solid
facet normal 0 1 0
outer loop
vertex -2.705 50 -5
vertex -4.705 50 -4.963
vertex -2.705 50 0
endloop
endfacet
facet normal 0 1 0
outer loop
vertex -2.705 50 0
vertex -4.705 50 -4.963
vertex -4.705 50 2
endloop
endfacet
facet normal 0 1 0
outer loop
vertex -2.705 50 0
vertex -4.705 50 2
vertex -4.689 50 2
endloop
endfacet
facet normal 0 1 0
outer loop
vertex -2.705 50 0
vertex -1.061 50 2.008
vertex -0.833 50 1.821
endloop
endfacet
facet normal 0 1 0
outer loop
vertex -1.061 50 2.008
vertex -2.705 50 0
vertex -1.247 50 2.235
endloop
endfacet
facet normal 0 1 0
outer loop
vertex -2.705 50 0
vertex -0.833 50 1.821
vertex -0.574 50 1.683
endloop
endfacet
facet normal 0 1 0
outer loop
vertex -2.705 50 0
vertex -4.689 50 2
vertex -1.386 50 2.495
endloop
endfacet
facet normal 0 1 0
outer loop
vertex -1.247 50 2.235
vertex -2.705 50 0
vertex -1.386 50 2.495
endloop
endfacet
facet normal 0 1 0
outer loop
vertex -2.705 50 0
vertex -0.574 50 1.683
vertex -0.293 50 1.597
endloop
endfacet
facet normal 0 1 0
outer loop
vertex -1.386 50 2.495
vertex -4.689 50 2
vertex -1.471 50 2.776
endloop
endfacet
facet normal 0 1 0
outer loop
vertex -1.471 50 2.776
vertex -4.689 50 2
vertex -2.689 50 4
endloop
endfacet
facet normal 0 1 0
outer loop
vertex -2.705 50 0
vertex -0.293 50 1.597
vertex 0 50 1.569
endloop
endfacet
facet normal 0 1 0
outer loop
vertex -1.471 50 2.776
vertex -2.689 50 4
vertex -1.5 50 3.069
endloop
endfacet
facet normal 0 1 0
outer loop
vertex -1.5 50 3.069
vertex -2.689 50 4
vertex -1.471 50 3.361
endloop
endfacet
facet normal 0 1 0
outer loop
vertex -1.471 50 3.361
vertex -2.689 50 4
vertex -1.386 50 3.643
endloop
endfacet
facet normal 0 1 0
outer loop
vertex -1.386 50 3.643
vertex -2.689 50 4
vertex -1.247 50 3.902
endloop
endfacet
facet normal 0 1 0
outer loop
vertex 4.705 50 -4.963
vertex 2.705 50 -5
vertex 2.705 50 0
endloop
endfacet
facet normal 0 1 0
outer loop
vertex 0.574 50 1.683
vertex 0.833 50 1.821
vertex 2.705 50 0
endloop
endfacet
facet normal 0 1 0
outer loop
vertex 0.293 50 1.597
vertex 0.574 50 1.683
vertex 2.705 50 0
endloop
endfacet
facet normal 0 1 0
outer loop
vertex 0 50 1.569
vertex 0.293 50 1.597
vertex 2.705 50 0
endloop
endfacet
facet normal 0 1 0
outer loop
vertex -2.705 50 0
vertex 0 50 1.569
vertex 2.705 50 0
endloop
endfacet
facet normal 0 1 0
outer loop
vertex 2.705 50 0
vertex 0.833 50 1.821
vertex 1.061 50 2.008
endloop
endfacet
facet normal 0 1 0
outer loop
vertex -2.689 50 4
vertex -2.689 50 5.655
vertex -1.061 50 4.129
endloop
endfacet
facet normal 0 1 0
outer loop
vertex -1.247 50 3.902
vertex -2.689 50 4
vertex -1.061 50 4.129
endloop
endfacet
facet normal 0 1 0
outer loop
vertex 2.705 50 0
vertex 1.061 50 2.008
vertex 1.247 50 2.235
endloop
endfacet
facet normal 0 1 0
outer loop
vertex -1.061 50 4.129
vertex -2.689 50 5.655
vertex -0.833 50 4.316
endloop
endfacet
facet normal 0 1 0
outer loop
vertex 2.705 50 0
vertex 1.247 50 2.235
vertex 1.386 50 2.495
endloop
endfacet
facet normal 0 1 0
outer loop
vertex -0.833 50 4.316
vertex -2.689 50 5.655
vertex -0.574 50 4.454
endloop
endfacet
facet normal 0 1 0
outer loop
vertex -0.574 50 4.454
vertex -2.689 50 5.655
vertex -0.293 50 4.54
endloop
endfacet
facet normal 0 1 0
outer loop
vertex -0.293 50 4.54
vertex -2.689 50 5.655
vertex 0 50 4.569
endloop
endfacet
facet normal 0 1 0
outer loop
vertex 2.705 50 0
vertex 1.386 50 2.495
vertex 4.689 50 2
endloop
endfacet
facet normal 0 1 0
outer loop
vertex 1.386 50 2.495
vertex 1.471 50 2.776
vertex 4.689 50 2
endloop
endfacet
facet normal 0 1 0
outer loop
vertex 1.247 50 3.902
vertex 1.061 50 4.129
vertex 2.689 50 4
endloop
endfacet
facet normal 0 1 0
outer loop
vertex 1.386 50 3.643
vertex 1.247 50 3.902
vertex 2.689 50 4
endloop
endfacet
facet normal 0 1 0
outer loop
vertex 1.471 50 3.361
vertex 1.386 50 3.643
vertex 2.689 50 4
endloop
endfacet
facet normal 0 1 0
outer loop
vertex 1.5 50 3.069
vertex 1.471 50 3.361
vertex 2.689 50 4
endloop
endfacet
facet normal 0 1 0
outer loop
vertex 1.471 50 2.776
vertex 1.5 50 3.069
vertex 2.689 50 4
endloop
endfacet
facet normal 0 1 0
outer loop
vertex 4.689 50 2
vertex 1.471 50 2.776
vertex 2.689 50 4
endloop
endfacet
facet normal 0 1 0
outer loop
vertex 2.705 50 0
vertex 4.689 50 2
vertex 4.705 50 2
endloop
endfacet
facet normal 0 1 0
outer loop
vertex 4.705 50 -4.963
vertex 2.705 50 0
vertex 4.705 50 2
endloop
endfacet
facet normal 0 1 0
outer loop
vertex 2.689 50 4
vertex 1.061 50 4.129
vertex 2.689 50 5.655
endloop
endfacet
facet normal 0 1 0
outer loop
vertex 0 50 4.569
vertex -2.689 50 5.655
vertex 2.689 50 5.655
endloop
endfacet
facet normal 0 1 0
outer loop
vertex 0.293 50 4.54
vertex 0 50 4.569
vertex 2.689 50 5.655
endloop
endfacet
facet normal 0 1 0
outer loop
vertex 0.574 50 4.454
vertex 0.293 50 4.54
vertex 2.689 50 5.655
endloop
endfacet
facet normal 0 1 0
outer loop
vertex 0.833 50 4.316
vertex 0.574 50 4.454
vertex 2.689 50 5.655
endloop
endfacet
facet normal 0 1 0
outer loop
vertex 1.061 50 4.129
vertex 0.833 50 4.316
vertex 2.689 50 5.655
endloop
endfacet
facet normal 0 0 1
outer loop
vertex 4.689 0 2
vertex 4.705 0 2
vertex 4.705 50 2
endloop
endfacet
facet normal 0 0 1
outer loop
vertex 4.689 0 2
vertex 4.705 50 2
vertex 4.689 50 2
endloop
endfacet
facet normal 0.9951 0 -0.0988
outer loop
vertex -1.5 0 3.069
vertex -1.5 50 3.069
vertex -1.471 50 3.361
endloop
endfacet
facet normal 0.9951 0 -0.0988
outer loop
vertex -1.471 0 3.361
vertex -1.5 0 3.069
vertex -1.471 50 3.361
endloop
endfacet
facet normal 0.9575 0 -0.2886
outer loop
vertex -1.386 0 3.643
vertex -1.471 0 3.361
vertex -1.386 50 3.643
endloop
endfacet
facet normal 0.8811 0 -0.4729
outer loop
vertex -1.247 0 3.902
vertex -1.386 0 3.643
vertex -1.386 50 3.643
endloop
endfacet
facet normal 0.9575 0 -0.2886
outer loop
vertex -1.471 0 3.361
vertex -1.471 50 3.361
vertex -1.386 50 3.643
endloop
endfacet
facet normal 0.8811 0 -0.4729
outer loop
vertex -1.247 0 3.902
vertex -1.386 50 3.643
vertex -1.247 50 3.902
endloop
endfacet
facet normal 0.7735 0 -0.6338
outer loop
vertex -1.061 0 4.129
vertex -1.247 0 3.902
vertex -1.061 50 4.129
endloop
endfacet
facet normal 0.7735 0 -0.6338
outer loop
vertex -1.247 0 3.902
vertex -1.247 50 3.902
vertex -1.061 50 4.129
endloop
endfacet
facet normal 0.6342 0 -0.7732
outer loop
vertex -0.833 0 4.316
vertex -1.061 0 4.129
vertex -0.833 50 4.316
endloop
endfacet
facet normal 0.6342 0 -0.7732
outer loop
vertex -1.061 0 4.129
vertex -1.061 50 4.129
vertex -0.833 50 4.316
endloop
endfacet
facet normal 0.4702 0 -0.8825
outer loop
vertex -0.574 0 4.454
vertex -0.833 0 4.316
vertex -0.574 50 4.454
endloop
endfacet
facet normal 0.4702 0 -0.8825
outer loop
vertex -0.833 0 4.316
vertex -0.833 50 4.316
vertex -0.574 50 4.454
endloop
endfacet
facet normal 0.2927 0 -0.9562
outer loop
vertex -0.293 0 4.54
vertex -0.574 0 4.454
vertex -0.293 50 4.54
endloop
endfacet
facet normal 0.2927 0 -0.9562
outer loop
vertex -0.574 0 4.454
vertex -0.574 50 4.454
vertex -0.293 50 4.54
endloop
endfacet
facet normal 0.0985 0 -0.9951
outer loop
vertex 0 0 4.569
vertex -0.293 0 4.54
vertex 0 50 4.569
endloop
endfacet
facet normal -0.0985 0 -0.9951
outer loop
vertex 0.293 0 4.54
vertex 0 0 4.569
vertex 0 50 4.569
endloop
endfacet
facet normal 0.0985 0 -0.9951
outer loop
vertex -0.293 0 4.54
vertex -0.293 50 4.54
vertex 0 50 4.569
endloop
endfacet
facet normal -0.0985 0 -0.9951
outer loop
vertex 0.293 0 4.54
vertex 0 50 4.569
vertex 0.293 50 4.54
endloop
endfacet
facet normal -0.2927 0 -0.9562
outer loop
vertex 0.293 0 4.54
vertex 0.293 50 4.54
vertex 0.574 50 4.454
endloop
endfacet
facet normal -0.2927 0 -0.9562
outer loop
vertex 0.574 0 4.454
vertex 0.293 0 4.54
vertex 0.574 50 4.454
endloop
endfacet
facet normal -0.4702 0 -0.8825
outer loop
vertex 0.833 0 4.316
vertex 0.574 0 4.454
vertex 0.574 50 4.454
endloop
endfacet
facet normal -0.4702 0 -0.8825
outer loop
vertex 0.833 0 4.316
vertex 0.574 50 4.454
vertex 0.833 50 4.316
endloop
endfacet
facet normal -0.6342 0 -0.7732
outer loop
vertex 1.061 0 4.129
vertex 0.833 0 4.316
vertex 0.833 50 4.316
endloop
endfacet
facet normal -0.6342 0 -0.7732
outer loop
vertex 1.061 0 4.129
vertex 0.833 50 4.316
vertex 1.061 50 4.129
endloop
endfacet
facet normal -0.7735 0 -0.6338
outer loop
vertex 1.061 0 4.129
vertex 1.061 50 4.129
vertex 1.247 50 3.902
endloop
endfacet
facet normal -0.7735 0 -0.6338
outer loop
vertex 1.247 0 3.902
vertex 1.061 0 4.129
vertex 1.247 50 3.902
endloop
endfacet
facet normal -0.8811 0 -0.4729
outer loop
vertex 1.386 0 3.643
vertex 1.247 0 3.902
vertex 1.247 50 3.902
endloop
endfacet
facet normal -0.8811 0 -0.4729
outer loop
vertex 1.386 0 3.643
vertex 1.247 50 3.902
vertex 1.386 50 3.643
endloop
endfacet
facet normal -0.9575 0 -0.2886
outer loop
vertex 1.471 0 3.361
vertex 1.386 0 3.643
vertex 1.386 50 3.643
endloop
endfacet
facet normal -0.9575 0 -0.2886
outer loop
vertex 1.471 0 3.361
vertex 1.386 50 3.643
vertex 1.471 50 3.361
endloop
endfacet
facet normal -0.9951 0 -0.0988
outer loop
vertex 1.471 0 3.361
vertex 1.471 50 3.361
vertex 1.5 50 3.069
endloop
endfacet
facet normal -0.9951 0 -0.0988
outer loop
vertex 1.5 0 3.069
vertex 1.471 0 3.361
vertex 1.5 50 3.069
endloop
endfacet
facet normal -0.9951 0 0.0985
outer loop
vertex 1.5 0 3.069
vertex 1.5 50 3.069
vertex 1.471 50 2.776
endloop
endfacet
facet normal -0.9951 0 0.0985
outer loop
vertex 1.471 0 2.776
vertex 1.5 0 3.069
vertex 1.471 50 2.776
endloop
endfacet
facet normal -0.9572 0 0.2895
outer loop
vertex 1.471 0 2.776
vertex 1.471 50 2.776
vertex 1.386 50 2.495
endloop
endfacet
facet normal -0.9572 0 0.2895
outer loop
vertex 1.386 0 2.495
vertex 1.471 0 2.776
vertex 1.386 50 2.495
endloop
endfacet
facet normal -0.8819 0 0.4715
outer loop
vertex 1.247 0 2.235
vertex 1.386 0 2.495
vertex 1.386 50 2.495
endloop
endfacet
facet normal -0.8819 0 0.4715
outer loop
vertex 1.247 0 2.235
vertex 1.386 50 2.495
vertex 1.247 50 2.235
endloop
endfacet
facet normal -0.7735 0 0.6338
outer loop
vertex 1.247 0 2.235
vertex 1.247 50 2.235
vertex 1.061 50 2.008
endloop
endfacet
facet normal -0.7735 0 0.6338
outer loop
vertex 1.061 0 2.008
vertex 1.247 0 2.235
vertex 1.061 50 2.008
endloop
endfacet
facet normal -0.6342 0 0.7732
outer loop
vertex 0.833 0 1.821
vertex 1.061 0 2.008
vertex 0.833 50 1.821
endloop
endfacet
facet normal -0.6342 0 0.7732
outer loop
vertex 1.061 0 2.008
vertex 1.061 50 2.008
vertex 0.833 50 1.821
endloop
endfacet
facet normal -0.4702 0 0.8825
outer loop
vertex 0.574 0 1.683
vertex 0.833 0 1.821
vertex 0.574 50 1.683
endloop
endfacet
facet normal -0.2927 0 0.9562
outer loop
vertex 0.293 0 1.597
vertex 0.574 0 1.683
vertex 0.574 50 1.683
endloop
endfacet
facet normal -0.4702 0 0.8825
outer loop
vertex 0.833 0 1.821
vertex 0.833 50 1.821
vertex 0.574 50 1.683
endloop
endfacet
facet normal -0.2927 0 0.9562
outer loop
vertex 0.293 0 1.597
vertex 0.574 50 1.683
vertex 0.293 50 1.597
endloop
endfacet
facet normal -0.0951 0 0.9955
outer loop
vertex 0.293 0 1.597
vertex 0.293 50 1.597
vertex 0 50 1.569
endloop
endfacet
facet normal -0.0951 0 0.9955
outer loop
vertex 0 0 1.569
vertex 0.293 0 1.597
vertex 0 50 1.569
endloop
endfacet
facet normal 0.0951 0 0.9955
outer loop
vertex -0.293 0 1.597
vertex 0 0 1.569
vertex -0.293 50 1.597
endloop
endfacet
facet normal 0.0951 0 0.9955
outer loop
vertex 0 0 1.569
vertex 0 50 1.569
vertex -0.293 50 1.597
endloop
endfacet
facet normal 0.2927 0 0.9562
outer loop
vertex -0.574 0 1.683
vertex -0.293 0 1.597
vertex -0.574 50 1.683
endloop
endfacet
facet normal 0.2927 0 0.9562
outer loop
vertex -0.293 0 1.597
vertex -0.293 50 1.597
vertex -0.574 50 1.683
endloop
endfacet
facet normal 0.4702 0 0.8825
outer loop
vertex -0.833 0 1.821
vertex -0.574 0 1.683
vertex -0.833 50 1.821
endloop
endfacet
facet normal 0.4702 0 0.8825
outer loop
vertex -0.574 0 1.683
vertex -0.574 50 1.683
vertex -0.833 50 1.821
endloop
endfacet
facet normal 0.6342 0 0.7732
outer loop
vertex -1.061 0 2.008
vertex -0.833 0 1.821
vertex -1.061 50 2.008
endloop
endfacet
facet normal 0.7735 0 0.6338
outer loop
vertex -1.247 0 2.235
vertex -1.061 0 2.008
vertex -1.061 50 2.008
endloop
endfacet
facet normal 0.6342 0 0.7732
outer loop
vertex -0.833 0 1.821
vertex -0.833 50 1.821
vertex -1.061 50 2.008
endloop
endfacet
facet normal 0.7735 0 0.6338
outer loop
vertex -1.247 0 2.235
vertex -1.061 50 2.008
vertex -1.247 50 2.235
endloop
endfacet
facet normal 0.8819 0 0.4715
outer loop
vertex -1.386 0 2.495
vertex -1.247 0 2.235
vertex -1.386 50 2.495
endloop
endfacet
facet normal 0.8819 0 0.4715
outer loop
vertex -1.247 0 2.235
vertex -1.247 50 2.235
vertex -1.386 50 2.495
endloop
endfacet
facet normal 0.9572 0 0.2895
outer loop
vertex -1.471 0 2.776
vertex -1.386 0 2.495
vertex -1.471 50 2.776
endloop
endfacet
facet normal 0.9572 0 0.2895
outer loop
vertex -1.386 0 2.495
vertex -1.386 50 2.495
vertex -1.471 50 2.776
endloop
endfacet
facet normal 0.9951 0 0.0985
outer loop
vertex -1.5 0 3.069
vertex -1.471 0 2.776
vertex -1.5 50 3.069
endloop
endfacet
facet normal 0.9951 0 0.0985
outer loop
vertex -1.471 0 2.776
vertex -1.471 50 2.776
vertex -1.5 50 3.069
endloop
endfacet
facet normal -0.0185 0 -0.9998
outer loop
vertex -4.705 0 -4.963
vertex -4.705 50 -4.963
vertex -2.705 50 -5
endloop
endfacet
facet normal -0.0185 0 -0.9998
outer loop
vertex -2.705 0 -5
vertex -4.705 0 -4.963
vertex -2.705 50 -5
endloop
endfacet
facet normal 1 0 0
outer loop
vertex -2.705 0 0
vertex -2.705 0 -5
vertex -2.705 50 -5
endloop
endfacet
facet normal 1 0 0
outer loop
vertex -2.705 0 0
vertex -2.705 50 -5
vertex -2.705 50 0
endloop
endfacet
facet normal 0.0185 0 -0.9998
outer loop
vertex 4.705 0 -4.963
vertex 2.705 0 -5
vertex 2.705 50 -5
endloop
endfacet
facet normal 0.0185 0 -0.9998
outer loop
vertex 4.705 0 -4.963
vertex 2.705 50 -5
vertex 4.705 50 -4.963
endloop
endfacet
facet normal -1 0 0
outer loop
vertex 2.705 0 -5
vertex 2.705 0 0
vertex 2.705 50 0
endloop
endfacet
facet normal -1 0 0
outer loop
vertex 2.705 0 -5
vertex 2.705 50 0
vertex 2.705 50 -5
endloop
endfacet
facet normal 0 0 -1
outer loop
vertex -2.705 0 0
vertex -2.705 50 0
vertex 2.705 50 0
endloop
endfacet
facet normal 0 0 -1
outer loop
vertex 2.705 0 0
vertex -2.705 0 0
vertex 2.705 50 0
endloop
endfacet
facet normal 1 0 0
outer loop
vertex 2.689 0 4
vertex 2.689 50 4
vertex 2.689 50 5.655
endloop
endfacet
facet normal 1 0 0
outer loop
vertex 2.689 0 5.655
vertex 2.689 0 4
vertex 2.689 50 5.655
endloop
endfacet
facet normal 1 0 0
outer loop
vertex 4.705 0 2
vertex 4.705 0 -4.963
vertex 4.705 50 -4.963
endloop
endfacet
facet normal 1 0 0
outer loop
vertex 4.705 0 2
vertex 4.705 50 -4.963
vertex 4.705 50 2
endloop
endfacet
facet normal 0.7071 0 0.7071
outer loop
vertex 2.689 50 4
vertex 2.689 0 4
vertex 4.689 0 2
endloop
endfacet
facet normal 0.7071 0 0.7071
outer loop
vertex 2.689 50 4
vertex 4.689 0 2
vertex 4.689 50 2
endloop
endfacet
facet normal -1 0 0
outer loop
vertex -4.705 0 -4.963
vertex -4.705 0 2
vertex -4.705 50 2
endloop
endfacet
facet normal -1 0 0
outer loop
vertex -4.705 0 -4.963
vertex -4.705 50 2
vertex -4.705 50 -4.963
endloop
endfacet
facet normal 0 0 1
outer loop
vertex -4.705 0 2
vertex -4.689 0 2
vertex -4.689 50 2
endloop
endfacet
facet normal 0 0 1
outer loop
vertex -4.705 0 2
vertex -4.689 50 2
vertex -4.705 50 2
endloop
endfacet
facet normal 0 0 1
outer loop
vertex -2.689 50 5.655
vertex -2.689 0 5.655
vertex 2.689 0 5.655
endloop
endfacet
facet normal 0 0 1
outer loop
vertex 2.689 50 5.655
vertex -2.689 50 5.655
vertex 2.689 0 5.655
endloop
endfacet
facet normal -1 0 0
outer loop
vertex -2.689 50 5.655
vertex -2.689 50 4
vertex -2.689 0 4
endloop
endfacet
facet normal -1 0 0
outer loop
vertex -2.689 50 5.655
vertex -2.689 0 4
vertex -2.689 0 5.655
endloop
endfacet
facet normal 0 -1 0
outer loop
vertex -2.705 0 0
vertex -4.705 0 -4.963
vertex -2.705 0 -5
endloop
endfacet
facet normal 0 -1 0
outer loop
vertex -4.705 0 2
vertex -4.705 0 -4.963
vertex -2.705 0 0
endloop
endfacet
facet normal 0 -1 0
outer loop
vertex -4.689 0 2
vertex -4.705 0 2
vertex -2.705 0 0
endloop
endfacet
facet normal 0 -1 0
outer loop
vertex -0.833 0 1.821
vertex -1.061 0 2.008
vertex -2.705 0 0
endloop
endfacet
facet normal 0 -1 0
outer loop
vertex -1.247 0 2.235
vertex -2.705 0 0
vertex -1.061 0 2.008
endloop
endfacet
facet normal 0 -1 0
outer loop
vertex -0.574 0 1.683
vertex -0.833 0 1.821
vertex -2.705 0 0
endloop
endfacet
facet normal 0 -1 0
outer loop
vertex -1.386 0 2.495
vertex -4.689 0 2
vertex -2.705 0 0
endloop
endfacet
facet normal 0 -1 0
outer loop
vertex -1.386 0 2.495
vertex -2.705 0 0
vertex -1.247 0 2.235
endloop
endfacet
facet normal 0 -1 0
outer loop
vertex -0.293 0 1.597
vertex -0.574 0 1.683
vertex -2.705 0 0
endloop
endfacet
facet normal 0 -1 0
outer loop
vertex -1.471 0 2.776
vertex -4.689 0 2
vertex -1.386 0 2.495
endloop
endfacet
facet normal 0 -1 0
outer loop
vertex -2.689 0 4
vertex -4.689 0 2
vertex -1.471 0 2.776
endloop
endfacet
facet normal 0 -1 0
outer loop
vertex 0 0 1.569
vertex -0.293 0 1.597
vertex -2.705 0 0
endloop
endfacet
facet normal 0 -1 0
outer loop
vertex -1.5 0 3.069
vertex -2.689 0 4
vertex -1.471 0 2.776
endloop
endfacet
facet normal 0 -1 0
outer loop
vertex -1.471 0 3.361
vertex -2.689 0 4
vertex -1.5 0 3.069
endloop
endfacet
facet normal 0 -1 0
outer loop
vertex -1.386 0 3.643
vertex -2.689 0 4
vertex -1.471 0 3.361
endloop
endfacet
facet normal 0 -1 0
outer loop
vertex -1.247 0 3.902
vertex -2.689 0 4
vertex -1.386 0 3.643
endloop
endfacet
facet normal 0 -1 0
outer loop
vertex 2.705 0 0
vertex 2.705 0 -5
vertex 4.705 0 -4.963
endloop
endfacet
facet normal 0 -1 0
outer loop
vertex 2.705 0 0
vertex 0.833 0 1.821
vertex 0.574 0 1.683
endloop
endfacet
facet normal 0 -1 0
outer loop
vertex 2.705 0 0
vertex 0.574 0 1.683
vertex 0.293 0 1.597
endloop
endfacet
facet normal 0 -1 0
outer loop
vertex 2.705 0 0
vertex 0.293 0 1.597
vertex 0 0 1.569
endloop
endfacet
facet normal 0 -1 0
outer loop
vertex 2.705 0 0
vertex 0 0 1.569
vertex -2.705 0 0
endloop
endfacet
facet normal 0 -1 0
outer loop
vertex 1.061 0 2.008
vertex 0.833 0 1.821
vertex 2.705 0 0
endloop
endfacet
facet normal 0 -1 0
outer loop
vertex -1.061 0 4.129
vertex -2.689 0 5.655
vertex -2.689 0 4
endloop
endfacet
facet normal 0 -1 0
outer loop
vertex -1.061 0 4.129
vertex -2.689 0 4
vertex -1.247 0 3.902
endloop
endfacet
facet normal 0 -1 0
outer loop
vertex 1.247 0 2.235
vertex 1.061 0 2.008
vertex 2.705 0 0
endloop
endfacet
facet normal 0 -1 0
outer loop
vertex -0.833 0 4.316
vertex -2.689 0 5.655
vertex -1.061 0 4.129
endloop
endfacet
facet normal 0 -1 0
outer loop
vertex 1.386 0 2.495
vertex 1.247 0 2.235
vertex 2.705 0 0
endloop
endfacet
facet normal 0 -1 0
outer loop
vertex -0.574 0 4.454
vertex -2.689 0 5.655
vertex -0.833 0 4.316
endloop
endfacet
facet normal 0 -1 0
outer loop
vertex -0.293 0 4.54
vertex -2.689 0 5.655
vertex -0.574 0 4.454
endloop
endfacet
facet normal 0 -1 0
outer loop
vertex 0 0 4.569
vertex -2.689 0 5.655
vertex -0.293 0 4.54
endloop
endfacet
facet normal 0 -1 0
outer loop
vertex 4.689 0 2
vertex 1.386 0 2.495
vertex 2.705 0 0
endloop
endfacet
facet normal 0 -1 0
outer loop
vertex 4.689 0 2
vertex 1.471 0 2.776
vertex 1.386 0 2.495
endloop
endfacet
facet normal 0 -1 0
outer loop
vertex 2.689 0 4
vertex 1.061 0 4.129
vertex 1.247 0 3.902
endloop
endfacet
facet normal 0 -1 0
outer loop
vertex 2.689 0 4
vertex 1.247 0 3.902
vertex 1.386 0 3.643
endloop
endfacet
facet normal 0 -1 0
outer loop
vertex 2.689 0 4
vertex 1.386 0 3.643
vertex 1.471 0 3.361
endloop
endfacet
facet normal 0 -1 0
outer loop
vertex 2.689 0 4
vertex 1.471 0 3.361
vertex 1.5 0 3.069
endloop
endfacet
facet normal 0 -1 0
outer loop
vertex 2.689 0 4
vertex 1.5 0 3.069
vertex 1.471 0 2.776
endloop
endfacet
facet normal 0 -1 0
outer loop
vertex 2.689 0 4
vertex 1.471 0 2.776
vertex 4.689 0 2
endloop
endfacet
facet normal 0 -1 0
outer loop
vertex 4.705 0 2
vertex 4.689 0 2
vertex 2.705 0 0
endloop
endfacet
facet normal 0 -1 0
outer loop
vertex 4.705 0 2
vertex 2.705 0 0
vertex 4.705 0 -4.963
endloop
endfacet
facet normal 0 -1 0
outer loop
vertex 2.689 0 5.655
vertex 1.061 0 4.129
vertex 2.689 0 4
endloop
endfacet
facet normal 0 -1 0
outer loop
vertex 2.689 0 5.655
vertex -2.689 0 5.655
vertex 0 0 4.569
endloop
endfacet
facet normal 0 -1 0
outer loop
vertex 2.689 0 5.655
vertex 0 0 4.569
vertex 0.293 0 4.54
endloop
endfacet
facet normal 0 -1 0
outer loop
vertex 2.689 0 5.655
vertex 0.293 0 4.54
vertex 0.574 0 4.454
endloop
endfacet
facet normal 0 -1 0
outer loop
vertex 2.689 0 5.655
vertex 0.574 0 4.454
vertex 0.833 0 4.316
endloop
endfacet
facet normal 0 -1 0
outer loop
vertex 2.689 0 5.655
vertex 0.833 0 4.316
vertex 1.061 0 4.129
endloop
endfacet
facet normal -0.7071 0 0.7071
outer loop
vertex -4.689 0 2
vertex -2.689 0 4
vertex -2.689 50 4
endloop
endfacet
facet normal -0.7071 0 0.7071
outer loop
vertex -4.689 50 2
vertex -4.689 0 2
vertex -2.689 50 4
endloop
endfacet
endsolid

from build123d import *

# Parameters (mm, degrees)
F0_W     = 5.37864
F0_H     = 3.654586
F1_DEPTH = 50
F3_D     = 3
F4_SIZE  = 2


with BuildPart() as f1:
    # F0 (on Front) → F1 (new body)
    with BuildSketch(Plane.XZ):
        Polygon((-2.704546, -5), (-2.704546, 0), (2.704546, 0), (2.704546, -5), (4.704546, -4.963173), (4.704546, 1.118637), (4.704546, 2), (4.361257, 2), (2.68932, 2), (-2.68932, 2), (-4.704546, 2), (-4.704546, 1.118637), (-4.704546, -4.963173), align=None)
        with Locations((0, 3.827293)):
            Rectangle(F0_W, F0_H)
    extrude(amount=-F1_DEPTH)

    # F3 (through all)
    with Locations(Plane.XZ):
        with Locations((0, 3.068567)):
            Hole(F3_D / 2)

    # F4
    f4_edges = [f1.edges().sort_by_distance(p)[0] for p in [
        (2.68932, 25, 2),
        (-2.68932, 25, 2),
    ]]
    chamfer(f4_edges, length=F4_SIZE)


solid = f1.part
